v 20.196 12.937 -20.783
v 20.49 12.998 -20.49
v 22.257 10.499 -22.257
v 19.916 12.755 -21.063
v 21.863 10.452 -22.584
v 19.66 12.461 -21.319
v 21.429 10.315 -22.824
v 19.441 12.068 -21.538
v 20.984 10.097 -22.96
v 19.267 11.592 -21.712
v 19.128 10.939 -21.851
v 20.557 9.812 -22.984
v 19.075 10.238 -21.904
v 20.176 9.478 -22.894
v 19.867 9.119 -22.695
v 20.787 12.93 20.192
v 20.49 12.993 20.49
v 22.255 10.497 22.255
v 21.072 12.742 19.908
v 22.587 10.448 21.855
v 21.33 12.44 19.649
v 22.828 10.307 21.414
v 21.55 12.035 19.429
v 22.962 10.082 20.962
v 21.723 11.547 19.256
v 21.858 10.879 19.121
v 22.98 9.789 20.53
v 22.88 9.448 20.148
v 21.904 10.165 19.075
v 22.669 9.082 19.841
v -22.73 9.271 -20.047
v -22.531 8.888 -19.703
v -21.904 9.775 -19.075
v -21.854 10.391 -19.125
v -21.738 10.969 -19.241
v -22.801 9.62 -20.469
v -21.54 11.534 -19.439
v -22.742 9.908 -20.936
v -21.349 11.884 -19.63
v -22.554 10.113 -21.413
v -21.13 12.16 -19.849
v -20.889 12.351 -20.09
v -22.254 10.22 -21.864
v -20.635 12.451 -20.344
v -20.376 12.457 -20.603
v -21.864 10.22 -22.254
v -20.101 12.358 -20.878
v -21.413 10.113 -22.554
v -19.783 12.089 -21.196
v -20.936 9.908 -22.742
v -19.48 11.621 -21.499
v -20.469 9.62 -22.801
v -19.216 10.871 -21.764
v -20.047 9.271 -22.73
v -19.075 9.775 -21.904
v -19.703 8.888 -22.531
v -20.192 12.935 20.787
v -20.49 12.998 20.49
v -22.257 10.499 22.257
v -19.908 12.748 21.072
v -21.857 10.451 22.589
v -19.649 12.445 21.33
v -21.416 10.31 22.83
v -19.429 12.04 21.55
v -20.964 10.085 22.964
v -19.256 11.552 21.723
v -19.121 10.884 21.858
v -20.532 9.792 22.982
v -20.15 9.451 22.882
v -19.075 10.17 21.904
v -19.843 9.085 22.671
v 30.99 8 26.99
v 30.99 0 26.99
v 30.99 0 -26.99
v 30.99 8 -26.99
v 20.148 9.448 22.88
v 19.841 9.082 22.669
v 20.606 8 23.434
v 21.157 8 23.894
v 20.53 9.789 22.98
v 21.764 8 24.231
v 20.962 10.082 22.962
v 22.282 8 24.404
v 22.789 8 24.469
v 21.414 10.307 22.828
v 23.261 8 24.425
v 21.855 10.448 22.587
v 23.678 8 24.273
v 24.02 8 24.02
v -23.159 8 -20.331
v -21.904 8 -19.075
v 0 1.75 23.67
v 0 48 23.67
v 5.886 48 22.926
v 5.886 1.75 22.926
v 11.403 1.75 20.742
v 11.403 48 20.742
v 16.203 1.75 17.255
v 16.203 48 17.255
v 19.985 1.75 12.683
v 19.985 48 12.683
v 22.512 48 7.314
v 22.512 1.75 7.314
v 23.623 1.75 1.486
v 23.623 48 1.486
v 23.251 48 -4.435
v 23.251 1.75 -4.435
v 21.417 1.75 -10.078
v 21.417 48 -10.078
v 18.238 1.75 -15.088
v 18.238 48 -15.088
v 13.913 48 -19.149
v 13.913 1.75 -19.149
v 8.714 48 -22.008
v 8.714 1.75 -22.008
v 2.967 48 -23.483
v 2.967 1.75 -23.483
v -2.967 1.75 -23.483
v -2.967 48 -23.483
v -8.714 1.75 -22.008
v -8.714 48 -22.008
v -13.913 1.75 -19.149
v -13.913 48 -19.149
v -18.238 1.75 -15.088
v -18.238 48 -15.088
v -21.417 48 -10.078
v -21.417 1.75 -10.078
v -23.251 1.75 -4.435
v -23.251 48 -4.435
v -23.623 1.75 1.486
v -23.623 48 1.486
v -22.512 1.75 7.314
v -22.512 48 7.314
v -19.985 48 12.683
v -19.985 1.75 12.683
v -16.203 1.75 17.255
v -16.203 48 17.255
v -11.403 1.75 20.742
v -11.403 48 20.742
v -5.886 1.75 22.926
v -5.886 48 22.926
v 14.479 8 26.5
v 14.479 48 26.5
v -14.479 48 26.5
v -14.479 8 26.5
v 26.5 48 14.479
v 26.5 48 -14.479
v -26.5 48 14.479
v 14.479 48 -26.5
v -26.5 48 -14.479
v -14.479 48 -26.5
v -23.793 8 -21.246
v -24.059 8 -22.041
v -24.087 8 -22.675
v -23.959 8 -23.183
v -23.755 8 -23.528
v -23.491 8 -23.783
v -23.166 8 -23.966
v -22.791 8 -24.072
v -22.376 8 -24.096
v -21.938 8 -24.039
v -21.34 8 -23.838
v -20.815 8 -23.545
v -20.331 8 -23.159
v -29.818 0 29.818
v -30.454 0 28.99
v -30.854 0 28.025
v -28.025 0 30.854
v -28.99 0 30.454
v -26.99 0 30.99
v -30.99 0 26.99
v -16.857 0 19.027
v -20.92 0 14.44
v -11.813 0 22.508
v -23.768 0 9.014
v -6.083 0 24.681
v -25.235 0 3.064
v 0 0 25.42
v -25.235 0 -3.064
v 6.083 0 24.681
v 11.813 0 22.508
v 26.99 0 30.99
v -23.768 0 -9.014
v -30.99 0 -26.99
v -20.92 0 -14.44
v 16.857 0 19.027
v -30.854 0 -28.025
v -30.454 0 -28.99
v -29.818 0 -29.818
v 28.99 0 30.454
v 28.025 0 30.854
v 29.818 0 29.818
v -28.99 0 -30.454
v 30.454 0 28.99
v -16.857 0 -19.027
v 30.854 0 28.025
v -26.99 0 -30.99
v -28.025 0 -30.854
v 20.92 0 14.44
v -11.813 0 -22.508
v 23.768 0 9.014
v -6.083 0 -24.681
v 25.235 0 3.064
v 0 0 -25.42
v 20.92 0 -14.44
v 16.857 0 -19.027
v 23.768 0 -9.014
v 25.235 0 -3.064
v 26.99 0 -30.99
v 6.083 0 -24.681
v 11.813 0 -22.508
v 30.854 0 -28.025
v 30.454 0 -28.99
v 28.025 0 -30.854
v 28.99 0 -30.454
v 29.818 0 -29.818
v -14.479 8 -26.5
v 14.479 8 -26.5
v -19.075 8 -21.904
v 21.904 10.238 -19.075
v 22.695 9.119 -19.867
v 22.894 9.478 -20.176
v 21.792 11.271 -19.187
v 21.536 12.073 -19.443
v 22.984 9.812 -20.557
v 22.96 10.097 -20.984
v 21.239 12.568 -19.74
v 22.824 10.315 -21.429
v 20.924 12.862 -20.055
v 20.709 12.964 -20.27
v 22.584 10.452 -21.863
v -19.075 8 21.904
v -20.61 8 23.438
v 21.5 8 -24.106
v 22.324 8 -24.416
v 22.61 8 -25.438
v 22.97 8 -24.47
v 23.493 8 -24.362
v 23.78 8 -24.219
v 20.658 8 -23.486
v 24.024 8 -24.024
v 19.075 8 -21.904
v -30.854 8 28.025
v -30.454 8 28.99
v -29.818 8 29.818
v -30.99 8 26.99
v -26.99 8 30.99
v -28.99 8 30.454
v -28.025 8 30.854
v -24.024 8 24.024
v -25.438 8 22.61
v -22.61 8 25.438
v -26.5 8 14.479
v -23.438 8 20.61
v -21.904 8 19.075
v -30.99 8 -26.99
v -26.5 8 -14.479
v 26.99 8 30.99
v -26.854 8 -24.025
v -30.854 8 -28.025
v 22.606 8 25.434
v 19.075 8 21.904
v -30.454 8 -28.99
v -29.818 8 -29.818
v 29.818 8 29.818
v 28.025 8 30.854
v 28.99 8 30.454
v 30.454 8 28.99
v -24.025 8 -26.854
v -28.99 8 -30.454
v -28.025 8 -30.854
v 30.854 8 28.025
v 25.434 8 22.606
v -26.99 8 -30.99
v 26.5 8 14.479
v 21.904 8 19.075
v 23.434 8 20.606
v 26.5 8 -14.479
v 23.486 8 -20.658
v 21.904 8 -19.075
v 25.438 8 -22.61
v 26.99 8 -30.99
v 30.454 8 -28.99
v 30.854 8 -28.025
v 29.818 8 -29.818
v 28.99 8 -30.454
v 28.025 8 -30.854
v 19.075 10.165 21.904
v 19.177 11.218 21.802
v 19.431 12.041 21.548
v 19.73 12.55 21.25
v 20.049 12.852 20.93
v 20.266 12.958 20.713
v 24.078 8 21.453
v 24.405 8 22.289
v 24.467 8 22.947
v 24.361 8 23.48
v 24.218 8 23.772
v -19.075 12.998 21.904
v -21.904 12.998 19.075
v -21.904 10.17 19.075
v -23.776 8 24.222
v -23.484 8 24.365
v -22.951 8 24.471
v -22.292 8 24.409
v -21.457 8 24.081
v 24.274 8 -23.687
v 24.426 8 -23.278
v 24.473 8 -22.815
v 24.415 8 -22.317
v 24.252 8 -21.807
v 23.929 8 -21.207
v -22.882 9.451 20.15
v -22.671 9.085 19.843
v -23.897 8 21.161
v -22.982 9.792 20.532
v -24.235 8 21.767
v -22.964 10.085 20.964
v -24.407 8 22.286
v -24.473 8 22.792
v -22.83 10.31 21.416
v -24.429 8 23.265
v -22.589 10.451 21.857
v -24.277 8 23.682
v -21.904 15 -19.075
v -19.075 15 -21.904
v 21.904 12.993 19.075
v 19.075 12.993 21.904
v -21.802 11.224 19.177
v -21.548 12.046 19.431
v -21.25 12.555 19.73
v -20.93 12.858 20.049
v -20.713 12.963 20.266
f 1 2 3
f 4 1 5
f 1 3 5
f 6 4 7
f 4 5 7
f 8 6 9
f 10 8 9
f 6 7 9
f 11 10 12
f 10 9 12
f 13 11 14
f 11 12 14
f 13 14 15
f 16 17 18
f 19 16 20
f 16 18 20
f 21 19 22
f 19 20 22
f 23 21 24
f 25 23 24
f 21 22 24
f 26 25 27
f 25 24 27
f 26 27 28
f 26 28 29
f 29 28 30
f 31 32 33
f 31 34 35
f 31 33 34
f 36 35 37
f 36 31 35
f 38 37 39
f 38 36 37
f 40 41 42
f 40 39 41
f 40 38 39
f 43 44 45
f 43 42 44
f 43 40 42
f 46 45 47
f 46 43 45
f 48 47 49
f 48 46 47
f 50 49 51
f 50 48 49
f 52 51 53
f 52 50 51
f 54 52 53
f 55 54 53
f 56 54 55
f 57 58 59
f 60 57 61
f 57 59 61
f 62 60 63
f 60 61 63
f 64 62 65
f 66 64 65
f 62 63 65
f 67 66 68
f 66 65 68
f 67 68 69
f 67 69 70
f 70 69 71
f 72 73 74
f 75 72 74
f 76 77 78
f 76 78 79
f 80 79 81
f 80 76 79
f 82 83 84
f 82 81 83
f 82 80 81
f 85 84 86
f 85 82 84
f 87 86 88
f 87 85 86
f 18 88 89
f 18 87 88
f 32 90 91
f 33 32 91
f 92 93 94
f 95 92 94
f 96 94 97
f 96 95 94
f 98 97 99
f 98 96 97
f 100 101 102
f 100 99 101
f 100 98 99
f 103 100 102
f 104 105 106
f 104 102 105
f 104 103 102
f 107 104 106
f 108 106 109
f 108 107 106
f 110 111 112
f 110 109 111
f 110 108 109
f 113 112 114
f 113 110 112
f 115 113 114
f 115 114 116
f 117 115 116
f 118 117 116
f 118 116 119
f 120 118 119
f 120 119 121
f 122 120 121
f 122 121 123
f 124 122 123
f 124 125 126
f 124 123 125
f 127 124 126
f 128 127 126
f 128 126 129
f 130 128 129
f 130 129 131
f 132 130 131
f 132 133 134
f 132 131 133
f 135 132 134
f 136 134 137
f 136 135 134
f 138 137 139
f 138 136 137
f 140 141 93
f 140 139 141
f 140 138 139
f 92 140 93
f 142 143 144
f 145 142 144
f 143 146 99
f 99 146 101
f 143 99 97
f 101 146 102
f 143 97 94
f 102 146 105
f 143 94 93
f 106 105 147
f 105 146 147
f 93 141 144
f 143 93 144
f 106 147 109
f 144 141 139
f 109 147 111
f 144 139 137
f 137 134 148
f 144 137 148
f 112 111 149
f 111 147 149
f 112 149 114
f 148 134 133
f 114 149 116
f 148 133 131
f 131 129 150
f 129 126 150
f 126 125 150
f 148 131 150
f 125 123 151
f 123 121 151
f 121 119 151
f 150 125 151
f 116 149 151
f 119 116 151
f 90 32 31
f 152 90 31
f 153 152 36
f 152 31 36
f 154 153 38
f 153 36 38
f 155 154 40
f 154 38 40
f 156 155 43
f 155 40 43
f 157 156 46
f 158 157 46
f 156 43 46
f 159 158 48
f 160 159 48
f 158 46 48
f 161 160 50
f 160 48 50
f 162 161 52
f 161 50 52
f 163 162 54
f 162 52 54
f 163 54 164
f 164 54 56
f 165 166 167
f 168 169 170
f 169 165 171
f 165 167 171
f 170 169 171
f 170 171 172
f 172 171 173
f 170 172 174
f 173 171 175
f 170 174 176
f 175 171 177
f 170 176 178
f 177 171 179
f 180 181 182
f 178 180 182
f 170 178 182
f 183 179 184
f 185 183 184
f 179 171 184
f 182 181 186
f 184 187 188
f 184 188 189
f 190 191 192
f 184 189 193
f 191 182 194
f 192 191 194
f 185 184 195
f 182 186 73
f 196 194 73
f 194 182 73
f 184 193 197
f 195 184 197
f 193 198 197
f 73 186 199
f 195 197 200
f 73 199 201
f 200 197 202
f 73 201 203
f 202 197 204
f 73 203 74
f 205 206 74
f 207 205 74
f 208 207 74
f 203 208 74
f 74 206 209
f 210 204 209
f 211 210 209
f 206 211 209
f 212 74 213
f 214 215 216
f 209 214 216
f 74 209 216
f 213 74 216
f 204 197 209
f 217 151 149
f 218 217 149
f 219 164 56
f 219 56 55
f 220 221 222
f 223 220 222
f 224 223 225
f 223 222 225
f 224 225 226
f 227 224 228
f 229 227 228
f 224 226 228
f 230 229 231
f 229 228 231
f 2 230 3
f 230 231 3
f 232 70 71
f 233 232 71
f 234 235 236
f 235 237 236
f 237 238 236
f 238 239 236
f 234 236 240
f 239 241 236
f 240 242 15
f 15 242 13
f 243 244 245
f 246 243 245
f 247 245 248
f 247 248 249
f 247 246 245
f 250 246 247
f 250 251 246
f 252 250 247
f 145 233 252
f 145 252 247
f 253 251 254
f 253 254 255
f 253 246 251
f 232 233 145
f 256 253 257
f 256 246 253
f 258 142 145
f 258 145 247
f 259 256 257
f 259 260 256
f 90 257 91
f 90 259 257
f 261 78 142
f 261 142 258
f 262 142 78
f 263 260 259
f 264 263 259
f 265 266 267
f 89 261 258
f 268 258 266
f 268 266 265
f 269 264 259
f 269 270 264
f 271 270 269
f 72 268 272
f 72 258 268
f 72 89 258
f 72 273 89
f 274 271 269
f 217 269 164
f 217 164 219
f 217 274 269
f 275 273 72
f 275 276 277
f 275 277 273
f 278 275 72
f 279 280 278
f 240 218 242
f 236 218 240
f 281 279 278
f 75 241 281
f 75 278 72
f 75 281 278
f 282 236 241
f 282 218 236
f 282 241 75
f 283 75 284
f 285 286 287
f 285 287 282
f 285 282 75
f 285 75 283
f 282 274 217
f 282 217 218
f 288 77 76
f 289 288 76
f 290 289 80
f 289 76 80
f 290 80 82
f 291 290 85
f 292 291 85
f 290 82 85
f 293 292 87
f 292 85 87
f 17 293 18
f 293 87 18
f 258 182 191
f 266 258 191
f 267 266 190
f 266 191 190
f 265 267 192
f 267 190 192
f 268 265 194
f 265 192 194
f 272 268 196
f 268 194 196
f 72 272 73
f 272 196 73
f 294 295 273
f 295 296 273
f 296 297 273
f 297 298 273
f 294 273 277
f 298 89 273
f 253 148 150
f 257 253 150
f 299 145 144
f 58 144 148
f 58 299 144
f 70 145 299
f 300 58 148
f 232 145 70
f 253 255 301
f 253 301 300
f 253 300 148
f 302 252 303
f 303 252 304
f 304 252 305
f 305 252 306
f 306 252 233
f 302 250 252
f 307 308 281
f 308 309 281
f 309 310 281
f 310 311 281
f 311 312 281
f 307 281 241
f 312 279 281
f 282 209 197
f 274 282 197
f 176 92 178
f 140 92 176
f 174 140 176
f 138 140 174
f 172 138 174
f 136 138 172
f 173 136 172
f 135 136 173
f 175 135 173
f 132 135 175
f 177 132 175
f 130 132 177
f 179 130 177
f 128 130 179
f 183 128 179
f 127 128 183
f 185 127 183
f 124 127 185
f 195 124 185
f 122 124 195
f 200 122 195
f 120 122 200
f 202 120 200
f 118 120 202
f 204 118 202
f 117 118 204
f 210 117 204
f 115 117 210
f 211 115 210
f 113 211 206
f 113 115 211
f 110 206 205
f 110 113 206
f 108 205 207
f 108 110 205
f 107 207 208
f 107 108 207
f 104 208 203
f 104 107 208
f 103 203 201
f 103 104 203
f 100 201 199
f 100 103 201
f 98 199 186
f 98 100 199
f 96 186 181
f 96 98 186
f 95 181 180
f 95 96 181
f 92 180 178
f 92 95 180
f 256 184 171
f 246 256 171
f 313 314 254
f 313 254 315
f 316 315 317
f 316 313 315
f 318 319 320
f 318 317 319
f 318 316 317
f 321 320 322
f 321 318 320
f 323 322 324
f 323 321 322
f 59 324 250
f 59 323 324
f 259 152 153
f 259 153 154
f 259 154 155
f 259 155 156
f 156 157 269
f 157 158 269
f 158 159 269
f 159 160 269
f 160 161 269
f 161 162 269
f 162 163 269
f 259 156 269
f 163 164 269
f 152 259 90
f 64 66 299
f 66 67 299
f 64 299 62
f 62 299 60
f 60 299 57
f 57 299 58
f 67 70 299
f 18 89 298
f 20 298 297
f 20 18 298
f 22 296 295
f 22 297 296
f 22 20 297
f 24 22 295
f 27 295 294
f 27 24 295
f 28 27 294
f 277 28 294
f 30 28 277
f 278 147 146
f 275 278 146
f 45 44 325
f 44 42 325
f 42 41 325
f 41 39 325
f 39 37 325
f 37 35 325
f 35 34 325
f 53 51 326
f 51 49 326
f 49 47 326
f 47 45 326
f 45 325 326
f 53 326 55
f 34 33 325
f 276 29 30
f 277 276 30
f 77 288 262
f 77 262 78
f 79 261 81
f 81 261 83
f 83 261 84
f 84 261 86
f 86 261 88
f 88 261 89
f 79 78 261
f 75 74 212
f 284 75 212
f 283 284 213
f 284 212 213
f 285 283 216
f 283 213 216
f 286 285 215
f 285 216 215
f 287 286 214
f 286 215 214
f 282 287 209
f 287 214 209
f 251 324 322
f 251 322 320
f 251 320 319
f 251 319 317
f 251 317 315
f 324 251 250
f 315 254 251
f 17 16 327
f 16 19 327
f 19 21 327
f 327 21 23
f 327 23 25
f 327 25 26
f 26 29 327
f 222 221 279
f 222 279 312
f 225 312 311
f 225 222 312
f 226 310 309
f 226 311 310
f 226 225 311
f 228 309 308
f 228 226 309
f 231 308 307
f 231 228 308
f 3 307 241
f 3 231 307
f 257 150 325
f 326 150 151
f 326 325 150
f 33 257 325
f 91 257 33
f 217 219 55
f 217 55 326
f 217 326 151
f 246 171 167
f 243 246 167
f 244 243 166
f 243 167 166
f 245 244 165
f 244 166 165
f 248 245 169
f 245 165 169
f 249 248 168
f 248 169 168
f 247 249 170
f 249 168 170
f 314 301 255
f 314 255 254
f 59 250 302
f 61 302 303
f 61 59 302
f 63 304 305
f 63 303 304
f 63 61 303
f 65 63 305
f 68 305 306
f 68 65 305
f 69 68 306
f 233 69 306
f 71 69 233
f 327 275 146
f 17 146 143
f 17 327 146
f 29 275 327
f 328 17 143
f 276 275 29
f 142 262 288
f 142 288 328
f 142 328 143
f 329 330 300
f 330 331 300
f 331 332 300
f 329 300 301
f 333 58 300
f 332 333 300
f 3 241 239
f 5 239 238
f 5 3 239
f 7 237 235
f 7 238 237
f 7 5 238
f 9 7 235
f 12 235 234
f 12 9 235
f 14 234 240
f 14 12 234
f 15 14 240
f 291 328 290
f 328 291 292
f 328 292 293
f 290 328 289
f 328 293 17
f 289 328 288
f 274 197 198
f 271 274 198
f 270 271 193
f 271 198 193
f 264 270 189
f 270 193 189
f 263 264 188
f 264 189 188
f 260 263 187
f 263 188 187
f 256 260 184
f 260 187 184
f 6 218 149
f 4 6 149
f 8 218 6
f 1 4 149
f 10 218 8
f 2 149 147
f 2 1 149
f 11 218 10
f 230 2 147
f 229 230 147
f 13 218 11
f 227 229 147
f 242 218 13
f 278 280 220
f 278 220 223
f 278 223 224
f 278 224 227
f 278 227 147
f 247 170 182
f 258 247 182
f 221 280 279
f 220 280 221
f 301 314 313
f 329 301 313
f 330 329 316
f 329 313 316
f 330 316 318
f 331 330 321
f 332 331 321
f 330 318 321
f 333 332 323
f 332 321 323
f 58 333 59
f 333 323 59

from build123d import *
from build123d.topology import SkipClean

# Parameters (mm, degrees)
BOSS_EXTRU_1_DEPTH                  = 8
BOSS_EXTRU_2_DEPTH                  = 40
ENL_V_MAT_EXTRU_1_DEPTH             = 65.998155358
ENL_V_MAT_EXTRU_1_DEPTH_BACK        = 65.998155358
ESQUISSE5_R                         = 23.67
CHANFREIN1_SIZE                     = 1.75
BOSS_EXTRU_3_DEPTH                  = 2
BOSS_EXTRU_4_DEPTH                  = 2
ENL_V_MAT_EXTRU_4_REACH             = 81.818
ENL_V_MAT_EXTRU_4_DIRECTION_2_REACH = 81.818
ENL_V_MAT_EXTRU_6_REACH             = 81.818
ENL_V_MAT_EXTRU_6_DIRECTION_2_REACH = 81.818
ENL_V_MAT_EXTRU_7_REACH             = 81.818
ENL_V_MAT_EXTRU_7_DIRECTION_2_REACH = 81.818
ENL_V_MAT_EXTRU_8_REACH             = 81.818
ENL_V_MAT_EXTRU_8_DIRECTION_2_REACH = 81.818


with BuildPart() as part:
    # Esquisse1 → Boss.-Extru.1 (new body)
    with BuildSketch(Plane(origin=(0, 0, 0), x_dir=(1, 0, 0), z_dir=(0, 1, 0))):
        with BuildLine():
            Line((-26.99, -30.99), (26.99, -30.99))
            ThreePointArc((26.99, -30.99), (29.818427125, -29.818427125), (30.99, -26.99))
            Line((30.99, -26.99), (30.99, 26.99))
            ThreePointArc((30.99, 26.99), (29.818427125, 29.818427125), (26.99, 30.99))
            Line((26.99, 30.99), (-26.99, 30.99))
            ThreePointArc((-26.99, 30.99), (-29.818427125, 29.818427125), (-30.99, 26.99))
            Line((-30.99, 26.99), (-30.99, -26.99))
            ThreePointArc((-30.99, -26.99), (-29.818427125, -29.818427125), (-26.99, -30.99))
        make_face()
    extrude(amount=BOSS_EXTRU_1_DEPTH)

    # Esquisse4 → Boss.-Extru.2 (add)
    with BuildSketch(Plane(origin=(0, 8, 0), x_dir=(1, 0, 0), z_dir=(0, 1, 0))):
        Polygon((-26.5, 14.47918472), (-14.47918472, 26.5), (14.47918472, 26.5), (26.5, 14.47918472), (26.5, -14.47918472), (14.47918472, -26.5), (-14.47918472, -26.5), (-26.5, -14.47918472), align=None)
    extrude(amount=BOSS_EXTRU_2_DEPTH)

    # Esquisse5 → Enlèv. mat.-Extru.1 (cut, two sides: drawn at the far end of the back side and taken through both)
    with BuildSketch(Plane(origin=(0, 48, 0), x_dir=(1, 0, 0), z_dir=(0, 1, 0)).offset(-ENL_V_MAT_EXTRU_1_DEPTH_BACK)):
        Circle(ESQUISSE5_R)
    extrude(amount=ENL_V_MAT_EXTRU_1_DEPTH + ENL_V_MAT_EXTRU_1_DEPTH_BACK, mode=Mode.SUBTRACT)

    # Chanfrein1
    chanfrein1_edges = [part.edges().sort_by_distance(p)[0] for p in [
        (-23.67, 0, 0),
    ]]
    chamfer(chanfrein1_edges, length=CHANFREIN1_SIZE)

    # Esquisse10 → Boss.-Extru.3 (add, symmetric)
    with BuildSketch(Plane(origin=(0, 0, 0), x_dir=(-0.7071067811865478, 0, -0.7071067811865472), z_dir=(0.7071067811865472, 0, -0.7071067811865478))):
        Polygon((-35.969720461, 6), (-28.969720461, 13), (-28.969720461, 6), align=None)
        Polygon((28.976659403, 15), (35.976659403, 8), (28.976659403, 8), align=None)
    extrude(amount=BOSS_EXTRU_3_DEPTH, both=True)

    # Esquisse11 → Boss.-Extru.4 (add, symmetric)
    with BuildSketch(Plane(origin=(0, 0, 0), x_dir=(0.7071067811865366, 0, -0.7071067811865585), z_dir=(0.7071067811865585, 0, 0.7071067811865366))):
        Polygon((-35.975, 6), (-28.975, 13), (-28.975, 6), align=None)
        Polygon((35.975, 6), (28.975, 13), (28.975, 6), align=None)
    extrude(amount=BOSS_EXTRU_4_DEPTH, both=True)

    # Enlèv. mat.-Extru.4: up to this plane
    enl_v_mat_extru_4_end = Plane(origin=(14.47918472, 48, -26.5), z_dir=(-0.7071067811865497, 0, 0.7071067811865456))
    # Esquisse13 → Enlèv. mat.-Extru.4 (cut, up to the surface)
    with BuildSketch(Plane(origin=(7.416369055, -10.488329701, -7.416369055), x_dir=(-0.8660254037844379, -0.4082482904638646, -0.2886751345948132), z_dir=(0.5000000000000014, -0.7071067811865476, -0.49999999999999856)), mode=Mode.PRIVATE) as enl_v_mat_extru_4_sk1:
        with BuildLine():
            Line((-15.50322883, 25.388978088), (-17.136222001, 24.234277543))
            ThreePointArc((-17.136222001, 24.234277543), (-15.666955767, 24.576563109), (-14.376367648, 23.795355721))
            Line((-14.376367648, 23.795355721), (-15.50322883, 25.388978088))
        make_face()
    enl_v_mat_extru_4_tool1 = split(extrude(enl_v_mat_extru_4_sk1.sketch, amount=-ENL_V_MAT_EXTRU_4_REACH, mode=Mode.PRIVATE), bisect_by=enl_v_mat_extru_4_end, keep=Keep.BOTH, mode=Mode.PRIVATE)
    add(enl_v_mat_extru_4_tool1.solids().sort_by_distance((20.935486, 10.183705, -23.131924))[0], mode=Mode.SUBTRACT)
    # Esquisse13 → Enlèv. mat.-Extru.4 (cut, up to the surface)
    with BuildSketch(Plane(origin=(7.416369055, -10.488329701, -7.416369055), x_dir=(-0.8660254037844379, -0.4082482904638646, -0.2886751345948132), z_dir=(0.5000000000000014, -0.7071067811865476, -0.49999999999999856)), mode=Mode.PRIVATE) as enl_v_mat_extru_4_sk2:
        with BuildLine():
            Line((-18.769215154, 23.079577011), (-17.642353972, 21.485954644))
            ThreePointArc((-17.642353972, 21.485954644), (-17.948687323, 22.963135244), (-17.136222001, 24.234277543))
            Line((-17.136222001, 24.234277543), (-18.769215154, 23.079577011))
        make_face()
    enl_v_mat_extru_4_tool2 = split(extrude(enl_v_mat_extru_4_sk2.sketch, amount=-ENL_V_MAT_EXTRU_4_REACH, mode=Mode.PRIVATE), bisect_by=enl_v_mat_extru_4_end, keep=Keep.BOTH, mode=Mode.PRIVATE)
    add(enl_v_mat_extru_4_tool2.solids().sort_by_distance((23.131924, 10.183705, -20.935486))[0], mode=Mode.SUBTRACT)

    # Enlèv. mat.-Extru.4 direction 2: up to this plane
    enl_v_mat_extru_4_direction_2_end = Plane(origin=(-26.99, 8, 26.99), z_dir=(0, -1, 0))
    # Esquisse13 → Enlèv. mat.-Extru.4 direction 2 (cut, up to the surface)
    with BuildSketch(Plane(origin=(7.416369055, -10.488329701, -7.416369055), x_dir=(-0.8660254037844379, -0.4082482904638646, -0.2886751345948132), z_dir=(0.5000000000000014, -0.7071067811865476, -0.49999999999999856)), mode=Mode.PRIVATE) as enl_v_mat_extru_4_direction_2_sk1:
        with BuildLine():
            Line((-15.50322883, 25.388978088), (-17.136222001, 24.234277543))
            ThreePointArc((-17.136222001, 24.234277543), (-15.666955767, 24.576563109), (-14.376367648, 23.795355721))
            Line((-14.376367648, 23.795355721), (-15.50322883, 25.388978088))
        make_face()
    enl_v_mat_extru_4_direction_2_tool1 = split(extrude(enl_v_mat_extru_4_direction_2_sk1.sketch, amount=ENL_V_MAT_EXTRU_4_DIRECTION_2_REACH, mode=Mode.PRIVATE), bisect_by=enl_v_mat_extru_4_direction_2_end, keep=Keep.BOTH, mode=Mode.PRIVATE)
    add(enl_v_mat_extru_4_direction_2_tool1.solids().sort_by_distance((20.935486, 10.183705, -23.131924))[0], mode=Mode.SUBTRACT)
    # Esquisse13 → Enlèv. mat.-Extru.4 direction 2 (cut, up to the surface)
    with BuildSketch(Plane(origin=(7.416369055, -10.488329701, -7.416369055), x_dir=(-0.8660254037844379, -0.4082482904638646, -0.2886751345948132), z_dir=(0.5000000000000014, -0.7071067811865476, -0.49999999999999856)), mode=Mode.PRIVATE) as enl_v_mat_extru_4_direction_2_sk2:
        with BuildLine():
            Line((-18.769215154, 23.079577011), (-17.642353972, 21.485954644))
            ThreePointArc((-17.642353972, 21.485954644), (-17.948687323, 22.963135244), (-17.136222001, 24.234277543))
            Line((-17.136222001, 24.234277543), (-18.769215154, 23.079577011))
        make_face()
    enl_v_mat_extru_4_direction_2_tool2 = split(extrude(enl_v_mat_extru_4_direction_2_sk2.sketch, amount=ENL_V_MAT_EXTRU_4_DIRECTION_2_REACH, mode=Mode.PRIVATE), bisect_by=enl_v_mat_extru_4_direction_2_end, keep=Keep.BOTH, mode=Mode.PRIVATE)
    add(enl_v_mat_extru_4_direction_2_tool2.solids().sort_by_distance((23.131924, 10.183705, -20.935486))[0], mode=Mode.SUBTRACT)

    # Enlèv. mat.-Extru.6: up to this plane
    enl_v_mat_extru_6_end = Plane(origin=(-26.5, 48, -14.47918472), z_dir=(0.7071067811865476, 0, 0.7071067811865476))
    # Esquisse15 → Enlèv. mat.-Extru.6 (cut, up to the surface)
    with BuildSketch(Plane(origin=(-7.416369055, -10.488329701, -7.416369055), x_dir=(-0.8660254037844388, 0.40824829046386296, 0.28867513459481287), z_dir=(-0.4999999999999999, -0.7071067811865477, -0.5)), mode=Mode.PRIVATE) as enl_v_mat_extru_6_sk1:
        with BuildLine():
            Line((14.187416942, 23.52813907), (16.32040286, 26.544636683))
            Line((16.32040286, 26.544636683), (19.586389183, 24.235235606))
            Line((19.586389183, 24.235235606), (17.453403266, 21.218737993))
            ThreePointArc((17.453403266, 21.218737993), (16.919004437, 23.927085537), (14.187416942, 23.52813907))
        make_face()
    enl_v_mat_extru_6_tool1 = split(extrude(enl_v_mat_extru_6_sk1.sketch, amount=-ENL_V_MAT_EXTRU_6_REACH, mode=Mode.PRIVATE), bisect_by=enl_v_mat_extru_6_end, keep=Keep.BOTH, mode=Mode.PRIVATE)
    add(enl_v_mat_extru_6_tool1.solids().sort_by_distance((-22.387383, 10.683882, -22.387383))[0], mode=Mode.SUBTRACT)

    # Enlèv. mat.-Extru.6 direction 2: up to this plane
    enl_v_mat_extru_6_direction_2_end = Plane(origin=(-26.99, 8, 26.99), z_dir=(0, -1, 0))
    # Esquisse15 → Enlèv. mat.-Extru.6 direction 2 (cut, up to the surface)
    with BuildSketch(Plane(origin=(-7.416369055, -10.488329701, -7.416369055), x_dir=(-0.8660254037844388, 0.40824829046386296, 0.28867513459481287), z_dir=(-0.4999999999999999, -0.7071067811865477, -0.5)), mode=Mode.PRIVATE) as enl_v_mat_extru_6_direction_2_sk1:
        with BuildLine():
            Line((14.187416942, 23.52813907), (16.32040286, 26.544636683))
            Line((16.32040286, 26.544636683), (19.586389183, 24.235235606))
            Line((19.586389183, 24.235235606), (17.453403266, 21.218737993))
            ThreePointArc((17.453403266, 21.218737993), (16.919004437, 23.927085537), (14.187416942, 23.52813907))
        make_face()
    enl_v_mat_extru_6_direction_2_tool1 = split(extrude(enl_v_mat_extru_6_direction_2_sk1.sketch, amount=ENL_V_MAT_EXTRU_6_DIRECTION_2_REACH, mode=Mode.PRIVATE), bisect_by=enl_v_mat_extru_6_direction_2_end, keep=Keep.BOTH, mode=Mode.PRIVATE)
    add(enl_v_mat_extru_6_direction_2_tool1.solids().sort_by_distance((-22.387383, 10.683882, -22.387383))[0], mode=Mode.SUBTRACT)

    # Enlèv. mat.-Extru.7: up to this plane
    enl_v_mat_extru_7_end = Plane(origin=(-14.47918472, 48, 26.5), z_dir=(0.7071067811865447, 0, -0.7071067811865503))
    # Esquisse16 → Enlèv. mat.-Extru.7 (cut, up to the surface)
    with BuildSketch(Plane(origin=(-7.416369055, -10.488329701, 7.416369055), x_dir=(-0.8660254037844398, 0.4082482904638608, -0.2886751345948125), z_dir=(-0.499999999999998, -0.7071067811865477, 0.500000000000002)), mode=Mode.PRIVATE) as enl_v_mat_extru_7_sk1:
        with BuildLine():
            Line((15.50322883, -25.388978088), (17.136221984, -24.234277555))
            ThreePointArc((17.136221984, -24.234277555), (15.643317492, -24.572481506), (14.348528292, -23.755984926))
            Line((14.348528292, -23.755984926), (15.50322883, -25.388978088))
        make_face()
    enl_v_mat_extru_7_tool1 = split(extrude(enl_v_mat_extru_7_sk1.sketch, amount=-ENL_V_MAT_EXTRU_7_REACH, mode=Mode.PRIVATE), bisect_by=enl_v_mat_extru_7_end, keep=Keep.BOTH, mode=Mode.PRIVATE)
    add(enl_v_mat_extru_7_tool1.solids().sort_by_distance((-20.935081, 10.18328, 23.131728))[0], mode=Mode.SUBTRACT)
    # Esquisse16 → Enlèv. mat.-Extru.7 (cut, up to the surface)
    with BuildSketch(Plane(origin=(-7.416369055, -10.488329701, 7.416369055), x_dir=(-0.8660254037844398, 0.4082482904638608, -0.2886751345948125), z_dir=(-0.499999999999998, -0.7071067811865477, 0.500000000000002)), mode=Mode.PRIVATE) as enl_v_mat_extru_7_sk2:
        with BuildLine():
            Line((18.769215154, -23.079577011), (17.614514616, -21.446583849))
            ThreePointArc((17.614514616, -21.446583849), (17.952718572, -22.93948835), (17.136221984, -24.234277555))
            Line((17.136221984, -24.234277555), (18.769215154, -23.079577011))
        make_face()
    enl_v_mat_extru_7_tool2 = split(extrude(enl_v_mat_extru_7_sk2.sketch, amount=-ENL_V_MAT_EXTRU_7_REACH, mode=Mode.PRIVATE), bisect_by=enl_v_mat_extru_7_end, keep=Keep.BOTH, mode=Mode.PRIVATE)
    add(enl_v_mat_extru_7_tool2.solids().sort_by_distance((-23.131728, 10.18328, 20.935081))[0], mode=Mode.SUBTRACT)

    # Enlèv. mat.-Extru.7 direction 2: up to this plane
    with SkipClean():  # the faces are left unmerged after this step: merging them gives an invalid solid
        enl_v_mat_extru_7_direction_2_end = Plane(origin=(-26.99, 8, 26.99), z_dir=(0, -1, 0))
        # Esquisse16 → Enlèv. mat.-Extru.7 direction 2 (cut, up to the surface)
        with BuildSketch(Plane(origin=(-7.416369055, -10.488329701, 7.416369055), x_dir=(-0.8660254037844398, 0.4082482904638608, -0.2886751345948125), z_dir=(-0.499999999999998, -0.7071067811865477, 0.500000000000002)), mode=Mode.PRIVATE) as enl_v_mat_extru_7_direction_2_sk1:
            with BuildLine():
                Line((15.50322883, -25.388978088), (17.136221984, -24.234277555))
                ThreePointArc((17.136221984, -24.234277555), (15.643317492, -24.572481506), (14.348528292, -23.755984926))
                Line((14.348528292, -23.755984926), (15.50322883, -25.388978088))
            make_face()
        enl_v_mat_extru_7_direction_2_tool1 = split(extrude(enl_v_mat_extru_7_direction_2_sk1.sketch, amount=ENL_V_MAT_EXTRU_7_DIRECTION_2_REACH, mode=Mode.PRIVATE), bisect_by=enl_v_mat_extru_7_direction_2_end, keep=Keep.BOTH, mode=Mode.PRIVATE)
        add(enl_v_mat_extru_7_direction_2_tool1.solids().sort_by_distance((-20.935081, 10.18328, 23.131728))[0], mode=Mode.SUBTRACT)
        # Esquisse16 → Enlèv. mat.-Extru.7 direction 2 (cut, up to the surface)
        with BuildSketch(Plane(origin=(-7.416369055, -10.488329701, 7.416369055), x_dir=(-0.8660254037844398, 0.4082482904638608, -0.2886751345948125), z_dir=(-0.499999999999998, -0.7071067811865477, 0.500000000000002)), mode=Mode.PRIVATE) as enl_v_mat_extru_7_direction_2_sk2:
            with BuildLine():
                Line((18.769215154, -23.079577011), (17.614514616, -21.446583849))
                ThreePointArc((17.614514616, -21.446583849), (17.952718572, -22.93948835), (17.136221984, -24.234277555))
                Line((17.136221984, -24.234277555), (18.769215154, -23.079577011))
            make_face()
        enl_v_mat_extru_7_direction_2_tool2 = split(extrude(enl_v_mat_extru_7_direction_2_sk2.sketch, amount=ENL_V_MAT_EXTRU_7_DIRECTION_2_REACH, mode=Mode.PRIVATE), bisect_by=enl_v_mat_extru_7_direction_2_end, keep=Keep.BOTH, mode=Mode.PRIVATE)
        add(enl_v_mat_extru_7_direction_2_tool2.solids().sort_by_distance((-23.131728, 10.18328, 20.935081))[0], mode=Mode.SUBTRACT)

    # Enlèv. mat.-Extru.8: up to this plane
    with SkipClean():  # the faces are left unmerged after this step: merging them gives an invalid solid
        enl_v_mat_extru_8_end = Plane(origin=(26.5, 48, 14.47918472), z_dir=(-0.7071067811865694, 0, -0.7071067811865256))
        # Esquisse12 → Enlèv. mat.-Extru.8 (cut, up to the surface)
        with BuildSketch(Plane(origin=(7.416369055, -10.488329701, 7.416369055), x_dir=(-0.8660254037844298, -0.4082482904638799, 0.2886751345948158), z_dir=(0.5000000000000154, -0.7071067811865477, 0.4999999999999844)), mode=Mode.PRIVATE) as enl_v_mat_extru_8_sk1:
            with BuildLine():
                Line((-18.767059791, -23.076528867), (-17.134066672, -24.231229375))
                ThreePointArc((-17.134066672, -24.231229375), (-17.950563215, -22.936440175), (-17.612359253, -21.443535706))
                Line((-17.612359253, -21.443535706), (-18.767059791, -23.076528867))
            make_face()
        enl_v_mat_extru_8_tool1 = split(extrude(enl_v_mat_extru_8_sk1.sketch, amount=-ENL_V_MAT_EXTRU_8_REACH, mode=Mode.PRIVATE), bisect_by=enl_v_mat_extru_8_end, keep=Keep.BOTH, mode=Mode.PRIVATE)
        add(enl_v_mat_extru_8_tool1.solids().sort_by_distance((23.129862, 10.180641, 20.933214))[0], mode=Mode.SUBTRACT)
        # Esquisse12 → Enlèv. mat.-Extru.8 (cut, up to the surface)
        with BuildSketch(Plane(origin=(7.416369055, -10.488329701, 7.416369055), x_dir=(-0.8660254037844298, -0.4082482904638799, 0.2886751345948158), z_dir=(0.5000000000000154, -0.7071067811865477, 0.4999999999999844)), mode=Mode.PRIVATE) as enl_v_mat_extru_8_sk2:
            with BuildLine():
                Line((-15.501073467, -25.385929944), (-14.346372929, -23.752936782))
                ThreePointArc((-14.346372929, -23.752936782), (-15.64116216, -24.569433368), (-17.134066672, -24.231229375))
                Line((-17.134066672, -24.231229375), (-15.501073467, -25.385929944))
            make_face()
        enl_v_mat_extru_8_tool2 = split(extrude(enl_v_mat_extru_8_sk2.sketch, amount=-ENL_V_MAT_EXTRU_8_REACH, mode=Mode.PRIVATE), bisect_by=enl_v_mat_extru_8_end, keep=Keep.BOTH, mode=Mode.PRIVATE)
        add(enl_v_mat_extru_8_tool2.solids().sort_by_distance((20.933214, 10.180641, 23.129862))[0], mode=Mode.SUBTRACT)

    # Enlèv. mat.-Extru.8 direction 2: up to this plane
    with SkipClean():  # the faces are left unmerged after this step: merging them gives an invalid solid
        enl_v_mat_extru_8_direction_2_end = Plane(origin=(-26.99, 8, 26.99), z_dir=(0, -1, 0))
        # Esquisse12 → Enlèv. mat.-Extru.8 direction 2 (cut, up to the surface)
        with BuildSketch(Plane(origin=(7.416369055, -10.488329701, 7.416369055), x_dir=(-0.8660254037844298, -0.4082482904638799, 0.2886751345948158), z_dir=(0.5000000000000154, -0.7071067811865477, 0.4999999999999844)), mode=Mode.PRIVATE) as enl_v_mat_extru_8_direction_2_sk1:
            with BuildLine():
                Line((-18.767059791, -23.076528867), (-17.134066672, -24.231229375))
                ThreePointArc((-17.134066672, -24.231229375), (-17.950563215, -22.936440175), (-17.612359253, -21.443535706))
                Line((-17.612359253, -21.443535706), (-18.767059791, -23.076528867))
            make_face()
        enl_v_mat_extru_8_direction_2_tool1 = split(extrude(enl_v_mat_extru_8_direction_2_sk1.sketch, amount=ENL_V_MAT_EXTRU_8_DIRECTION_2_REACH, mode=Mode.PRIVATE), bisect_by=enl_v_mat_extru_8_direction_2_end, keep=Keep.BOTH, mode=Mode.PRIVATE)
        add(enl_v_mat_extru_8_direction_2_tool1.solids().sort_by_distance((23.129862, 10.180641, 20.933214))[0], mode=Mode.SUBTRACT)
        # Esquisse12 → Enlèv. mat.-Extru.8 direction 2 (cut, up to the surface)
        with BuildSketch(Plane(origin=(7.416369055, -10.488329701, 7.416369055), x_dir=(-0.8660254037844298, -0.4082482904638799, 0.2886751345948158), z_dir=(0.5000000000000154, -0.7071067811865477, 0.4999999999999844)), mode=Mode.PRIVATE) as enl_v_mat_extru_8_direction_2_sk2:
            with BuildLine():
                Line((-15.501073467, -25.385929944), (-14.346372929, -23.752936782))
                ThreePointArc((-14.346372929, -23.752936782), (-15.64116216, -24.569433368), (-17.134066672, -24.231229375))
                Line((-17.134066672, -24.231229375), (-15.501073467, -25.385929944))
            make_face()
        enl_v_mat_extru_8_direction_2_tool2 = split(extrude(enl_v_mat_extru_8_direction_2_sk2.sketch, amount=ENL_V_MAT_EXTRU_8_DIRECTION_2_REACH, mode=Mode.PRIVATE), bisect_by=enl_v_mat_extru_8_direction_2_end, keep=Keep.BOTH, mode=Mode.PRIVATE)
        add(enl_v_mat_extru_8_direction_2_tool2.solids().sort_by_distance((20.933214, 10.180641, 23.129862))[0], mode=Mode.SUBTRACT)


solid = part.part
